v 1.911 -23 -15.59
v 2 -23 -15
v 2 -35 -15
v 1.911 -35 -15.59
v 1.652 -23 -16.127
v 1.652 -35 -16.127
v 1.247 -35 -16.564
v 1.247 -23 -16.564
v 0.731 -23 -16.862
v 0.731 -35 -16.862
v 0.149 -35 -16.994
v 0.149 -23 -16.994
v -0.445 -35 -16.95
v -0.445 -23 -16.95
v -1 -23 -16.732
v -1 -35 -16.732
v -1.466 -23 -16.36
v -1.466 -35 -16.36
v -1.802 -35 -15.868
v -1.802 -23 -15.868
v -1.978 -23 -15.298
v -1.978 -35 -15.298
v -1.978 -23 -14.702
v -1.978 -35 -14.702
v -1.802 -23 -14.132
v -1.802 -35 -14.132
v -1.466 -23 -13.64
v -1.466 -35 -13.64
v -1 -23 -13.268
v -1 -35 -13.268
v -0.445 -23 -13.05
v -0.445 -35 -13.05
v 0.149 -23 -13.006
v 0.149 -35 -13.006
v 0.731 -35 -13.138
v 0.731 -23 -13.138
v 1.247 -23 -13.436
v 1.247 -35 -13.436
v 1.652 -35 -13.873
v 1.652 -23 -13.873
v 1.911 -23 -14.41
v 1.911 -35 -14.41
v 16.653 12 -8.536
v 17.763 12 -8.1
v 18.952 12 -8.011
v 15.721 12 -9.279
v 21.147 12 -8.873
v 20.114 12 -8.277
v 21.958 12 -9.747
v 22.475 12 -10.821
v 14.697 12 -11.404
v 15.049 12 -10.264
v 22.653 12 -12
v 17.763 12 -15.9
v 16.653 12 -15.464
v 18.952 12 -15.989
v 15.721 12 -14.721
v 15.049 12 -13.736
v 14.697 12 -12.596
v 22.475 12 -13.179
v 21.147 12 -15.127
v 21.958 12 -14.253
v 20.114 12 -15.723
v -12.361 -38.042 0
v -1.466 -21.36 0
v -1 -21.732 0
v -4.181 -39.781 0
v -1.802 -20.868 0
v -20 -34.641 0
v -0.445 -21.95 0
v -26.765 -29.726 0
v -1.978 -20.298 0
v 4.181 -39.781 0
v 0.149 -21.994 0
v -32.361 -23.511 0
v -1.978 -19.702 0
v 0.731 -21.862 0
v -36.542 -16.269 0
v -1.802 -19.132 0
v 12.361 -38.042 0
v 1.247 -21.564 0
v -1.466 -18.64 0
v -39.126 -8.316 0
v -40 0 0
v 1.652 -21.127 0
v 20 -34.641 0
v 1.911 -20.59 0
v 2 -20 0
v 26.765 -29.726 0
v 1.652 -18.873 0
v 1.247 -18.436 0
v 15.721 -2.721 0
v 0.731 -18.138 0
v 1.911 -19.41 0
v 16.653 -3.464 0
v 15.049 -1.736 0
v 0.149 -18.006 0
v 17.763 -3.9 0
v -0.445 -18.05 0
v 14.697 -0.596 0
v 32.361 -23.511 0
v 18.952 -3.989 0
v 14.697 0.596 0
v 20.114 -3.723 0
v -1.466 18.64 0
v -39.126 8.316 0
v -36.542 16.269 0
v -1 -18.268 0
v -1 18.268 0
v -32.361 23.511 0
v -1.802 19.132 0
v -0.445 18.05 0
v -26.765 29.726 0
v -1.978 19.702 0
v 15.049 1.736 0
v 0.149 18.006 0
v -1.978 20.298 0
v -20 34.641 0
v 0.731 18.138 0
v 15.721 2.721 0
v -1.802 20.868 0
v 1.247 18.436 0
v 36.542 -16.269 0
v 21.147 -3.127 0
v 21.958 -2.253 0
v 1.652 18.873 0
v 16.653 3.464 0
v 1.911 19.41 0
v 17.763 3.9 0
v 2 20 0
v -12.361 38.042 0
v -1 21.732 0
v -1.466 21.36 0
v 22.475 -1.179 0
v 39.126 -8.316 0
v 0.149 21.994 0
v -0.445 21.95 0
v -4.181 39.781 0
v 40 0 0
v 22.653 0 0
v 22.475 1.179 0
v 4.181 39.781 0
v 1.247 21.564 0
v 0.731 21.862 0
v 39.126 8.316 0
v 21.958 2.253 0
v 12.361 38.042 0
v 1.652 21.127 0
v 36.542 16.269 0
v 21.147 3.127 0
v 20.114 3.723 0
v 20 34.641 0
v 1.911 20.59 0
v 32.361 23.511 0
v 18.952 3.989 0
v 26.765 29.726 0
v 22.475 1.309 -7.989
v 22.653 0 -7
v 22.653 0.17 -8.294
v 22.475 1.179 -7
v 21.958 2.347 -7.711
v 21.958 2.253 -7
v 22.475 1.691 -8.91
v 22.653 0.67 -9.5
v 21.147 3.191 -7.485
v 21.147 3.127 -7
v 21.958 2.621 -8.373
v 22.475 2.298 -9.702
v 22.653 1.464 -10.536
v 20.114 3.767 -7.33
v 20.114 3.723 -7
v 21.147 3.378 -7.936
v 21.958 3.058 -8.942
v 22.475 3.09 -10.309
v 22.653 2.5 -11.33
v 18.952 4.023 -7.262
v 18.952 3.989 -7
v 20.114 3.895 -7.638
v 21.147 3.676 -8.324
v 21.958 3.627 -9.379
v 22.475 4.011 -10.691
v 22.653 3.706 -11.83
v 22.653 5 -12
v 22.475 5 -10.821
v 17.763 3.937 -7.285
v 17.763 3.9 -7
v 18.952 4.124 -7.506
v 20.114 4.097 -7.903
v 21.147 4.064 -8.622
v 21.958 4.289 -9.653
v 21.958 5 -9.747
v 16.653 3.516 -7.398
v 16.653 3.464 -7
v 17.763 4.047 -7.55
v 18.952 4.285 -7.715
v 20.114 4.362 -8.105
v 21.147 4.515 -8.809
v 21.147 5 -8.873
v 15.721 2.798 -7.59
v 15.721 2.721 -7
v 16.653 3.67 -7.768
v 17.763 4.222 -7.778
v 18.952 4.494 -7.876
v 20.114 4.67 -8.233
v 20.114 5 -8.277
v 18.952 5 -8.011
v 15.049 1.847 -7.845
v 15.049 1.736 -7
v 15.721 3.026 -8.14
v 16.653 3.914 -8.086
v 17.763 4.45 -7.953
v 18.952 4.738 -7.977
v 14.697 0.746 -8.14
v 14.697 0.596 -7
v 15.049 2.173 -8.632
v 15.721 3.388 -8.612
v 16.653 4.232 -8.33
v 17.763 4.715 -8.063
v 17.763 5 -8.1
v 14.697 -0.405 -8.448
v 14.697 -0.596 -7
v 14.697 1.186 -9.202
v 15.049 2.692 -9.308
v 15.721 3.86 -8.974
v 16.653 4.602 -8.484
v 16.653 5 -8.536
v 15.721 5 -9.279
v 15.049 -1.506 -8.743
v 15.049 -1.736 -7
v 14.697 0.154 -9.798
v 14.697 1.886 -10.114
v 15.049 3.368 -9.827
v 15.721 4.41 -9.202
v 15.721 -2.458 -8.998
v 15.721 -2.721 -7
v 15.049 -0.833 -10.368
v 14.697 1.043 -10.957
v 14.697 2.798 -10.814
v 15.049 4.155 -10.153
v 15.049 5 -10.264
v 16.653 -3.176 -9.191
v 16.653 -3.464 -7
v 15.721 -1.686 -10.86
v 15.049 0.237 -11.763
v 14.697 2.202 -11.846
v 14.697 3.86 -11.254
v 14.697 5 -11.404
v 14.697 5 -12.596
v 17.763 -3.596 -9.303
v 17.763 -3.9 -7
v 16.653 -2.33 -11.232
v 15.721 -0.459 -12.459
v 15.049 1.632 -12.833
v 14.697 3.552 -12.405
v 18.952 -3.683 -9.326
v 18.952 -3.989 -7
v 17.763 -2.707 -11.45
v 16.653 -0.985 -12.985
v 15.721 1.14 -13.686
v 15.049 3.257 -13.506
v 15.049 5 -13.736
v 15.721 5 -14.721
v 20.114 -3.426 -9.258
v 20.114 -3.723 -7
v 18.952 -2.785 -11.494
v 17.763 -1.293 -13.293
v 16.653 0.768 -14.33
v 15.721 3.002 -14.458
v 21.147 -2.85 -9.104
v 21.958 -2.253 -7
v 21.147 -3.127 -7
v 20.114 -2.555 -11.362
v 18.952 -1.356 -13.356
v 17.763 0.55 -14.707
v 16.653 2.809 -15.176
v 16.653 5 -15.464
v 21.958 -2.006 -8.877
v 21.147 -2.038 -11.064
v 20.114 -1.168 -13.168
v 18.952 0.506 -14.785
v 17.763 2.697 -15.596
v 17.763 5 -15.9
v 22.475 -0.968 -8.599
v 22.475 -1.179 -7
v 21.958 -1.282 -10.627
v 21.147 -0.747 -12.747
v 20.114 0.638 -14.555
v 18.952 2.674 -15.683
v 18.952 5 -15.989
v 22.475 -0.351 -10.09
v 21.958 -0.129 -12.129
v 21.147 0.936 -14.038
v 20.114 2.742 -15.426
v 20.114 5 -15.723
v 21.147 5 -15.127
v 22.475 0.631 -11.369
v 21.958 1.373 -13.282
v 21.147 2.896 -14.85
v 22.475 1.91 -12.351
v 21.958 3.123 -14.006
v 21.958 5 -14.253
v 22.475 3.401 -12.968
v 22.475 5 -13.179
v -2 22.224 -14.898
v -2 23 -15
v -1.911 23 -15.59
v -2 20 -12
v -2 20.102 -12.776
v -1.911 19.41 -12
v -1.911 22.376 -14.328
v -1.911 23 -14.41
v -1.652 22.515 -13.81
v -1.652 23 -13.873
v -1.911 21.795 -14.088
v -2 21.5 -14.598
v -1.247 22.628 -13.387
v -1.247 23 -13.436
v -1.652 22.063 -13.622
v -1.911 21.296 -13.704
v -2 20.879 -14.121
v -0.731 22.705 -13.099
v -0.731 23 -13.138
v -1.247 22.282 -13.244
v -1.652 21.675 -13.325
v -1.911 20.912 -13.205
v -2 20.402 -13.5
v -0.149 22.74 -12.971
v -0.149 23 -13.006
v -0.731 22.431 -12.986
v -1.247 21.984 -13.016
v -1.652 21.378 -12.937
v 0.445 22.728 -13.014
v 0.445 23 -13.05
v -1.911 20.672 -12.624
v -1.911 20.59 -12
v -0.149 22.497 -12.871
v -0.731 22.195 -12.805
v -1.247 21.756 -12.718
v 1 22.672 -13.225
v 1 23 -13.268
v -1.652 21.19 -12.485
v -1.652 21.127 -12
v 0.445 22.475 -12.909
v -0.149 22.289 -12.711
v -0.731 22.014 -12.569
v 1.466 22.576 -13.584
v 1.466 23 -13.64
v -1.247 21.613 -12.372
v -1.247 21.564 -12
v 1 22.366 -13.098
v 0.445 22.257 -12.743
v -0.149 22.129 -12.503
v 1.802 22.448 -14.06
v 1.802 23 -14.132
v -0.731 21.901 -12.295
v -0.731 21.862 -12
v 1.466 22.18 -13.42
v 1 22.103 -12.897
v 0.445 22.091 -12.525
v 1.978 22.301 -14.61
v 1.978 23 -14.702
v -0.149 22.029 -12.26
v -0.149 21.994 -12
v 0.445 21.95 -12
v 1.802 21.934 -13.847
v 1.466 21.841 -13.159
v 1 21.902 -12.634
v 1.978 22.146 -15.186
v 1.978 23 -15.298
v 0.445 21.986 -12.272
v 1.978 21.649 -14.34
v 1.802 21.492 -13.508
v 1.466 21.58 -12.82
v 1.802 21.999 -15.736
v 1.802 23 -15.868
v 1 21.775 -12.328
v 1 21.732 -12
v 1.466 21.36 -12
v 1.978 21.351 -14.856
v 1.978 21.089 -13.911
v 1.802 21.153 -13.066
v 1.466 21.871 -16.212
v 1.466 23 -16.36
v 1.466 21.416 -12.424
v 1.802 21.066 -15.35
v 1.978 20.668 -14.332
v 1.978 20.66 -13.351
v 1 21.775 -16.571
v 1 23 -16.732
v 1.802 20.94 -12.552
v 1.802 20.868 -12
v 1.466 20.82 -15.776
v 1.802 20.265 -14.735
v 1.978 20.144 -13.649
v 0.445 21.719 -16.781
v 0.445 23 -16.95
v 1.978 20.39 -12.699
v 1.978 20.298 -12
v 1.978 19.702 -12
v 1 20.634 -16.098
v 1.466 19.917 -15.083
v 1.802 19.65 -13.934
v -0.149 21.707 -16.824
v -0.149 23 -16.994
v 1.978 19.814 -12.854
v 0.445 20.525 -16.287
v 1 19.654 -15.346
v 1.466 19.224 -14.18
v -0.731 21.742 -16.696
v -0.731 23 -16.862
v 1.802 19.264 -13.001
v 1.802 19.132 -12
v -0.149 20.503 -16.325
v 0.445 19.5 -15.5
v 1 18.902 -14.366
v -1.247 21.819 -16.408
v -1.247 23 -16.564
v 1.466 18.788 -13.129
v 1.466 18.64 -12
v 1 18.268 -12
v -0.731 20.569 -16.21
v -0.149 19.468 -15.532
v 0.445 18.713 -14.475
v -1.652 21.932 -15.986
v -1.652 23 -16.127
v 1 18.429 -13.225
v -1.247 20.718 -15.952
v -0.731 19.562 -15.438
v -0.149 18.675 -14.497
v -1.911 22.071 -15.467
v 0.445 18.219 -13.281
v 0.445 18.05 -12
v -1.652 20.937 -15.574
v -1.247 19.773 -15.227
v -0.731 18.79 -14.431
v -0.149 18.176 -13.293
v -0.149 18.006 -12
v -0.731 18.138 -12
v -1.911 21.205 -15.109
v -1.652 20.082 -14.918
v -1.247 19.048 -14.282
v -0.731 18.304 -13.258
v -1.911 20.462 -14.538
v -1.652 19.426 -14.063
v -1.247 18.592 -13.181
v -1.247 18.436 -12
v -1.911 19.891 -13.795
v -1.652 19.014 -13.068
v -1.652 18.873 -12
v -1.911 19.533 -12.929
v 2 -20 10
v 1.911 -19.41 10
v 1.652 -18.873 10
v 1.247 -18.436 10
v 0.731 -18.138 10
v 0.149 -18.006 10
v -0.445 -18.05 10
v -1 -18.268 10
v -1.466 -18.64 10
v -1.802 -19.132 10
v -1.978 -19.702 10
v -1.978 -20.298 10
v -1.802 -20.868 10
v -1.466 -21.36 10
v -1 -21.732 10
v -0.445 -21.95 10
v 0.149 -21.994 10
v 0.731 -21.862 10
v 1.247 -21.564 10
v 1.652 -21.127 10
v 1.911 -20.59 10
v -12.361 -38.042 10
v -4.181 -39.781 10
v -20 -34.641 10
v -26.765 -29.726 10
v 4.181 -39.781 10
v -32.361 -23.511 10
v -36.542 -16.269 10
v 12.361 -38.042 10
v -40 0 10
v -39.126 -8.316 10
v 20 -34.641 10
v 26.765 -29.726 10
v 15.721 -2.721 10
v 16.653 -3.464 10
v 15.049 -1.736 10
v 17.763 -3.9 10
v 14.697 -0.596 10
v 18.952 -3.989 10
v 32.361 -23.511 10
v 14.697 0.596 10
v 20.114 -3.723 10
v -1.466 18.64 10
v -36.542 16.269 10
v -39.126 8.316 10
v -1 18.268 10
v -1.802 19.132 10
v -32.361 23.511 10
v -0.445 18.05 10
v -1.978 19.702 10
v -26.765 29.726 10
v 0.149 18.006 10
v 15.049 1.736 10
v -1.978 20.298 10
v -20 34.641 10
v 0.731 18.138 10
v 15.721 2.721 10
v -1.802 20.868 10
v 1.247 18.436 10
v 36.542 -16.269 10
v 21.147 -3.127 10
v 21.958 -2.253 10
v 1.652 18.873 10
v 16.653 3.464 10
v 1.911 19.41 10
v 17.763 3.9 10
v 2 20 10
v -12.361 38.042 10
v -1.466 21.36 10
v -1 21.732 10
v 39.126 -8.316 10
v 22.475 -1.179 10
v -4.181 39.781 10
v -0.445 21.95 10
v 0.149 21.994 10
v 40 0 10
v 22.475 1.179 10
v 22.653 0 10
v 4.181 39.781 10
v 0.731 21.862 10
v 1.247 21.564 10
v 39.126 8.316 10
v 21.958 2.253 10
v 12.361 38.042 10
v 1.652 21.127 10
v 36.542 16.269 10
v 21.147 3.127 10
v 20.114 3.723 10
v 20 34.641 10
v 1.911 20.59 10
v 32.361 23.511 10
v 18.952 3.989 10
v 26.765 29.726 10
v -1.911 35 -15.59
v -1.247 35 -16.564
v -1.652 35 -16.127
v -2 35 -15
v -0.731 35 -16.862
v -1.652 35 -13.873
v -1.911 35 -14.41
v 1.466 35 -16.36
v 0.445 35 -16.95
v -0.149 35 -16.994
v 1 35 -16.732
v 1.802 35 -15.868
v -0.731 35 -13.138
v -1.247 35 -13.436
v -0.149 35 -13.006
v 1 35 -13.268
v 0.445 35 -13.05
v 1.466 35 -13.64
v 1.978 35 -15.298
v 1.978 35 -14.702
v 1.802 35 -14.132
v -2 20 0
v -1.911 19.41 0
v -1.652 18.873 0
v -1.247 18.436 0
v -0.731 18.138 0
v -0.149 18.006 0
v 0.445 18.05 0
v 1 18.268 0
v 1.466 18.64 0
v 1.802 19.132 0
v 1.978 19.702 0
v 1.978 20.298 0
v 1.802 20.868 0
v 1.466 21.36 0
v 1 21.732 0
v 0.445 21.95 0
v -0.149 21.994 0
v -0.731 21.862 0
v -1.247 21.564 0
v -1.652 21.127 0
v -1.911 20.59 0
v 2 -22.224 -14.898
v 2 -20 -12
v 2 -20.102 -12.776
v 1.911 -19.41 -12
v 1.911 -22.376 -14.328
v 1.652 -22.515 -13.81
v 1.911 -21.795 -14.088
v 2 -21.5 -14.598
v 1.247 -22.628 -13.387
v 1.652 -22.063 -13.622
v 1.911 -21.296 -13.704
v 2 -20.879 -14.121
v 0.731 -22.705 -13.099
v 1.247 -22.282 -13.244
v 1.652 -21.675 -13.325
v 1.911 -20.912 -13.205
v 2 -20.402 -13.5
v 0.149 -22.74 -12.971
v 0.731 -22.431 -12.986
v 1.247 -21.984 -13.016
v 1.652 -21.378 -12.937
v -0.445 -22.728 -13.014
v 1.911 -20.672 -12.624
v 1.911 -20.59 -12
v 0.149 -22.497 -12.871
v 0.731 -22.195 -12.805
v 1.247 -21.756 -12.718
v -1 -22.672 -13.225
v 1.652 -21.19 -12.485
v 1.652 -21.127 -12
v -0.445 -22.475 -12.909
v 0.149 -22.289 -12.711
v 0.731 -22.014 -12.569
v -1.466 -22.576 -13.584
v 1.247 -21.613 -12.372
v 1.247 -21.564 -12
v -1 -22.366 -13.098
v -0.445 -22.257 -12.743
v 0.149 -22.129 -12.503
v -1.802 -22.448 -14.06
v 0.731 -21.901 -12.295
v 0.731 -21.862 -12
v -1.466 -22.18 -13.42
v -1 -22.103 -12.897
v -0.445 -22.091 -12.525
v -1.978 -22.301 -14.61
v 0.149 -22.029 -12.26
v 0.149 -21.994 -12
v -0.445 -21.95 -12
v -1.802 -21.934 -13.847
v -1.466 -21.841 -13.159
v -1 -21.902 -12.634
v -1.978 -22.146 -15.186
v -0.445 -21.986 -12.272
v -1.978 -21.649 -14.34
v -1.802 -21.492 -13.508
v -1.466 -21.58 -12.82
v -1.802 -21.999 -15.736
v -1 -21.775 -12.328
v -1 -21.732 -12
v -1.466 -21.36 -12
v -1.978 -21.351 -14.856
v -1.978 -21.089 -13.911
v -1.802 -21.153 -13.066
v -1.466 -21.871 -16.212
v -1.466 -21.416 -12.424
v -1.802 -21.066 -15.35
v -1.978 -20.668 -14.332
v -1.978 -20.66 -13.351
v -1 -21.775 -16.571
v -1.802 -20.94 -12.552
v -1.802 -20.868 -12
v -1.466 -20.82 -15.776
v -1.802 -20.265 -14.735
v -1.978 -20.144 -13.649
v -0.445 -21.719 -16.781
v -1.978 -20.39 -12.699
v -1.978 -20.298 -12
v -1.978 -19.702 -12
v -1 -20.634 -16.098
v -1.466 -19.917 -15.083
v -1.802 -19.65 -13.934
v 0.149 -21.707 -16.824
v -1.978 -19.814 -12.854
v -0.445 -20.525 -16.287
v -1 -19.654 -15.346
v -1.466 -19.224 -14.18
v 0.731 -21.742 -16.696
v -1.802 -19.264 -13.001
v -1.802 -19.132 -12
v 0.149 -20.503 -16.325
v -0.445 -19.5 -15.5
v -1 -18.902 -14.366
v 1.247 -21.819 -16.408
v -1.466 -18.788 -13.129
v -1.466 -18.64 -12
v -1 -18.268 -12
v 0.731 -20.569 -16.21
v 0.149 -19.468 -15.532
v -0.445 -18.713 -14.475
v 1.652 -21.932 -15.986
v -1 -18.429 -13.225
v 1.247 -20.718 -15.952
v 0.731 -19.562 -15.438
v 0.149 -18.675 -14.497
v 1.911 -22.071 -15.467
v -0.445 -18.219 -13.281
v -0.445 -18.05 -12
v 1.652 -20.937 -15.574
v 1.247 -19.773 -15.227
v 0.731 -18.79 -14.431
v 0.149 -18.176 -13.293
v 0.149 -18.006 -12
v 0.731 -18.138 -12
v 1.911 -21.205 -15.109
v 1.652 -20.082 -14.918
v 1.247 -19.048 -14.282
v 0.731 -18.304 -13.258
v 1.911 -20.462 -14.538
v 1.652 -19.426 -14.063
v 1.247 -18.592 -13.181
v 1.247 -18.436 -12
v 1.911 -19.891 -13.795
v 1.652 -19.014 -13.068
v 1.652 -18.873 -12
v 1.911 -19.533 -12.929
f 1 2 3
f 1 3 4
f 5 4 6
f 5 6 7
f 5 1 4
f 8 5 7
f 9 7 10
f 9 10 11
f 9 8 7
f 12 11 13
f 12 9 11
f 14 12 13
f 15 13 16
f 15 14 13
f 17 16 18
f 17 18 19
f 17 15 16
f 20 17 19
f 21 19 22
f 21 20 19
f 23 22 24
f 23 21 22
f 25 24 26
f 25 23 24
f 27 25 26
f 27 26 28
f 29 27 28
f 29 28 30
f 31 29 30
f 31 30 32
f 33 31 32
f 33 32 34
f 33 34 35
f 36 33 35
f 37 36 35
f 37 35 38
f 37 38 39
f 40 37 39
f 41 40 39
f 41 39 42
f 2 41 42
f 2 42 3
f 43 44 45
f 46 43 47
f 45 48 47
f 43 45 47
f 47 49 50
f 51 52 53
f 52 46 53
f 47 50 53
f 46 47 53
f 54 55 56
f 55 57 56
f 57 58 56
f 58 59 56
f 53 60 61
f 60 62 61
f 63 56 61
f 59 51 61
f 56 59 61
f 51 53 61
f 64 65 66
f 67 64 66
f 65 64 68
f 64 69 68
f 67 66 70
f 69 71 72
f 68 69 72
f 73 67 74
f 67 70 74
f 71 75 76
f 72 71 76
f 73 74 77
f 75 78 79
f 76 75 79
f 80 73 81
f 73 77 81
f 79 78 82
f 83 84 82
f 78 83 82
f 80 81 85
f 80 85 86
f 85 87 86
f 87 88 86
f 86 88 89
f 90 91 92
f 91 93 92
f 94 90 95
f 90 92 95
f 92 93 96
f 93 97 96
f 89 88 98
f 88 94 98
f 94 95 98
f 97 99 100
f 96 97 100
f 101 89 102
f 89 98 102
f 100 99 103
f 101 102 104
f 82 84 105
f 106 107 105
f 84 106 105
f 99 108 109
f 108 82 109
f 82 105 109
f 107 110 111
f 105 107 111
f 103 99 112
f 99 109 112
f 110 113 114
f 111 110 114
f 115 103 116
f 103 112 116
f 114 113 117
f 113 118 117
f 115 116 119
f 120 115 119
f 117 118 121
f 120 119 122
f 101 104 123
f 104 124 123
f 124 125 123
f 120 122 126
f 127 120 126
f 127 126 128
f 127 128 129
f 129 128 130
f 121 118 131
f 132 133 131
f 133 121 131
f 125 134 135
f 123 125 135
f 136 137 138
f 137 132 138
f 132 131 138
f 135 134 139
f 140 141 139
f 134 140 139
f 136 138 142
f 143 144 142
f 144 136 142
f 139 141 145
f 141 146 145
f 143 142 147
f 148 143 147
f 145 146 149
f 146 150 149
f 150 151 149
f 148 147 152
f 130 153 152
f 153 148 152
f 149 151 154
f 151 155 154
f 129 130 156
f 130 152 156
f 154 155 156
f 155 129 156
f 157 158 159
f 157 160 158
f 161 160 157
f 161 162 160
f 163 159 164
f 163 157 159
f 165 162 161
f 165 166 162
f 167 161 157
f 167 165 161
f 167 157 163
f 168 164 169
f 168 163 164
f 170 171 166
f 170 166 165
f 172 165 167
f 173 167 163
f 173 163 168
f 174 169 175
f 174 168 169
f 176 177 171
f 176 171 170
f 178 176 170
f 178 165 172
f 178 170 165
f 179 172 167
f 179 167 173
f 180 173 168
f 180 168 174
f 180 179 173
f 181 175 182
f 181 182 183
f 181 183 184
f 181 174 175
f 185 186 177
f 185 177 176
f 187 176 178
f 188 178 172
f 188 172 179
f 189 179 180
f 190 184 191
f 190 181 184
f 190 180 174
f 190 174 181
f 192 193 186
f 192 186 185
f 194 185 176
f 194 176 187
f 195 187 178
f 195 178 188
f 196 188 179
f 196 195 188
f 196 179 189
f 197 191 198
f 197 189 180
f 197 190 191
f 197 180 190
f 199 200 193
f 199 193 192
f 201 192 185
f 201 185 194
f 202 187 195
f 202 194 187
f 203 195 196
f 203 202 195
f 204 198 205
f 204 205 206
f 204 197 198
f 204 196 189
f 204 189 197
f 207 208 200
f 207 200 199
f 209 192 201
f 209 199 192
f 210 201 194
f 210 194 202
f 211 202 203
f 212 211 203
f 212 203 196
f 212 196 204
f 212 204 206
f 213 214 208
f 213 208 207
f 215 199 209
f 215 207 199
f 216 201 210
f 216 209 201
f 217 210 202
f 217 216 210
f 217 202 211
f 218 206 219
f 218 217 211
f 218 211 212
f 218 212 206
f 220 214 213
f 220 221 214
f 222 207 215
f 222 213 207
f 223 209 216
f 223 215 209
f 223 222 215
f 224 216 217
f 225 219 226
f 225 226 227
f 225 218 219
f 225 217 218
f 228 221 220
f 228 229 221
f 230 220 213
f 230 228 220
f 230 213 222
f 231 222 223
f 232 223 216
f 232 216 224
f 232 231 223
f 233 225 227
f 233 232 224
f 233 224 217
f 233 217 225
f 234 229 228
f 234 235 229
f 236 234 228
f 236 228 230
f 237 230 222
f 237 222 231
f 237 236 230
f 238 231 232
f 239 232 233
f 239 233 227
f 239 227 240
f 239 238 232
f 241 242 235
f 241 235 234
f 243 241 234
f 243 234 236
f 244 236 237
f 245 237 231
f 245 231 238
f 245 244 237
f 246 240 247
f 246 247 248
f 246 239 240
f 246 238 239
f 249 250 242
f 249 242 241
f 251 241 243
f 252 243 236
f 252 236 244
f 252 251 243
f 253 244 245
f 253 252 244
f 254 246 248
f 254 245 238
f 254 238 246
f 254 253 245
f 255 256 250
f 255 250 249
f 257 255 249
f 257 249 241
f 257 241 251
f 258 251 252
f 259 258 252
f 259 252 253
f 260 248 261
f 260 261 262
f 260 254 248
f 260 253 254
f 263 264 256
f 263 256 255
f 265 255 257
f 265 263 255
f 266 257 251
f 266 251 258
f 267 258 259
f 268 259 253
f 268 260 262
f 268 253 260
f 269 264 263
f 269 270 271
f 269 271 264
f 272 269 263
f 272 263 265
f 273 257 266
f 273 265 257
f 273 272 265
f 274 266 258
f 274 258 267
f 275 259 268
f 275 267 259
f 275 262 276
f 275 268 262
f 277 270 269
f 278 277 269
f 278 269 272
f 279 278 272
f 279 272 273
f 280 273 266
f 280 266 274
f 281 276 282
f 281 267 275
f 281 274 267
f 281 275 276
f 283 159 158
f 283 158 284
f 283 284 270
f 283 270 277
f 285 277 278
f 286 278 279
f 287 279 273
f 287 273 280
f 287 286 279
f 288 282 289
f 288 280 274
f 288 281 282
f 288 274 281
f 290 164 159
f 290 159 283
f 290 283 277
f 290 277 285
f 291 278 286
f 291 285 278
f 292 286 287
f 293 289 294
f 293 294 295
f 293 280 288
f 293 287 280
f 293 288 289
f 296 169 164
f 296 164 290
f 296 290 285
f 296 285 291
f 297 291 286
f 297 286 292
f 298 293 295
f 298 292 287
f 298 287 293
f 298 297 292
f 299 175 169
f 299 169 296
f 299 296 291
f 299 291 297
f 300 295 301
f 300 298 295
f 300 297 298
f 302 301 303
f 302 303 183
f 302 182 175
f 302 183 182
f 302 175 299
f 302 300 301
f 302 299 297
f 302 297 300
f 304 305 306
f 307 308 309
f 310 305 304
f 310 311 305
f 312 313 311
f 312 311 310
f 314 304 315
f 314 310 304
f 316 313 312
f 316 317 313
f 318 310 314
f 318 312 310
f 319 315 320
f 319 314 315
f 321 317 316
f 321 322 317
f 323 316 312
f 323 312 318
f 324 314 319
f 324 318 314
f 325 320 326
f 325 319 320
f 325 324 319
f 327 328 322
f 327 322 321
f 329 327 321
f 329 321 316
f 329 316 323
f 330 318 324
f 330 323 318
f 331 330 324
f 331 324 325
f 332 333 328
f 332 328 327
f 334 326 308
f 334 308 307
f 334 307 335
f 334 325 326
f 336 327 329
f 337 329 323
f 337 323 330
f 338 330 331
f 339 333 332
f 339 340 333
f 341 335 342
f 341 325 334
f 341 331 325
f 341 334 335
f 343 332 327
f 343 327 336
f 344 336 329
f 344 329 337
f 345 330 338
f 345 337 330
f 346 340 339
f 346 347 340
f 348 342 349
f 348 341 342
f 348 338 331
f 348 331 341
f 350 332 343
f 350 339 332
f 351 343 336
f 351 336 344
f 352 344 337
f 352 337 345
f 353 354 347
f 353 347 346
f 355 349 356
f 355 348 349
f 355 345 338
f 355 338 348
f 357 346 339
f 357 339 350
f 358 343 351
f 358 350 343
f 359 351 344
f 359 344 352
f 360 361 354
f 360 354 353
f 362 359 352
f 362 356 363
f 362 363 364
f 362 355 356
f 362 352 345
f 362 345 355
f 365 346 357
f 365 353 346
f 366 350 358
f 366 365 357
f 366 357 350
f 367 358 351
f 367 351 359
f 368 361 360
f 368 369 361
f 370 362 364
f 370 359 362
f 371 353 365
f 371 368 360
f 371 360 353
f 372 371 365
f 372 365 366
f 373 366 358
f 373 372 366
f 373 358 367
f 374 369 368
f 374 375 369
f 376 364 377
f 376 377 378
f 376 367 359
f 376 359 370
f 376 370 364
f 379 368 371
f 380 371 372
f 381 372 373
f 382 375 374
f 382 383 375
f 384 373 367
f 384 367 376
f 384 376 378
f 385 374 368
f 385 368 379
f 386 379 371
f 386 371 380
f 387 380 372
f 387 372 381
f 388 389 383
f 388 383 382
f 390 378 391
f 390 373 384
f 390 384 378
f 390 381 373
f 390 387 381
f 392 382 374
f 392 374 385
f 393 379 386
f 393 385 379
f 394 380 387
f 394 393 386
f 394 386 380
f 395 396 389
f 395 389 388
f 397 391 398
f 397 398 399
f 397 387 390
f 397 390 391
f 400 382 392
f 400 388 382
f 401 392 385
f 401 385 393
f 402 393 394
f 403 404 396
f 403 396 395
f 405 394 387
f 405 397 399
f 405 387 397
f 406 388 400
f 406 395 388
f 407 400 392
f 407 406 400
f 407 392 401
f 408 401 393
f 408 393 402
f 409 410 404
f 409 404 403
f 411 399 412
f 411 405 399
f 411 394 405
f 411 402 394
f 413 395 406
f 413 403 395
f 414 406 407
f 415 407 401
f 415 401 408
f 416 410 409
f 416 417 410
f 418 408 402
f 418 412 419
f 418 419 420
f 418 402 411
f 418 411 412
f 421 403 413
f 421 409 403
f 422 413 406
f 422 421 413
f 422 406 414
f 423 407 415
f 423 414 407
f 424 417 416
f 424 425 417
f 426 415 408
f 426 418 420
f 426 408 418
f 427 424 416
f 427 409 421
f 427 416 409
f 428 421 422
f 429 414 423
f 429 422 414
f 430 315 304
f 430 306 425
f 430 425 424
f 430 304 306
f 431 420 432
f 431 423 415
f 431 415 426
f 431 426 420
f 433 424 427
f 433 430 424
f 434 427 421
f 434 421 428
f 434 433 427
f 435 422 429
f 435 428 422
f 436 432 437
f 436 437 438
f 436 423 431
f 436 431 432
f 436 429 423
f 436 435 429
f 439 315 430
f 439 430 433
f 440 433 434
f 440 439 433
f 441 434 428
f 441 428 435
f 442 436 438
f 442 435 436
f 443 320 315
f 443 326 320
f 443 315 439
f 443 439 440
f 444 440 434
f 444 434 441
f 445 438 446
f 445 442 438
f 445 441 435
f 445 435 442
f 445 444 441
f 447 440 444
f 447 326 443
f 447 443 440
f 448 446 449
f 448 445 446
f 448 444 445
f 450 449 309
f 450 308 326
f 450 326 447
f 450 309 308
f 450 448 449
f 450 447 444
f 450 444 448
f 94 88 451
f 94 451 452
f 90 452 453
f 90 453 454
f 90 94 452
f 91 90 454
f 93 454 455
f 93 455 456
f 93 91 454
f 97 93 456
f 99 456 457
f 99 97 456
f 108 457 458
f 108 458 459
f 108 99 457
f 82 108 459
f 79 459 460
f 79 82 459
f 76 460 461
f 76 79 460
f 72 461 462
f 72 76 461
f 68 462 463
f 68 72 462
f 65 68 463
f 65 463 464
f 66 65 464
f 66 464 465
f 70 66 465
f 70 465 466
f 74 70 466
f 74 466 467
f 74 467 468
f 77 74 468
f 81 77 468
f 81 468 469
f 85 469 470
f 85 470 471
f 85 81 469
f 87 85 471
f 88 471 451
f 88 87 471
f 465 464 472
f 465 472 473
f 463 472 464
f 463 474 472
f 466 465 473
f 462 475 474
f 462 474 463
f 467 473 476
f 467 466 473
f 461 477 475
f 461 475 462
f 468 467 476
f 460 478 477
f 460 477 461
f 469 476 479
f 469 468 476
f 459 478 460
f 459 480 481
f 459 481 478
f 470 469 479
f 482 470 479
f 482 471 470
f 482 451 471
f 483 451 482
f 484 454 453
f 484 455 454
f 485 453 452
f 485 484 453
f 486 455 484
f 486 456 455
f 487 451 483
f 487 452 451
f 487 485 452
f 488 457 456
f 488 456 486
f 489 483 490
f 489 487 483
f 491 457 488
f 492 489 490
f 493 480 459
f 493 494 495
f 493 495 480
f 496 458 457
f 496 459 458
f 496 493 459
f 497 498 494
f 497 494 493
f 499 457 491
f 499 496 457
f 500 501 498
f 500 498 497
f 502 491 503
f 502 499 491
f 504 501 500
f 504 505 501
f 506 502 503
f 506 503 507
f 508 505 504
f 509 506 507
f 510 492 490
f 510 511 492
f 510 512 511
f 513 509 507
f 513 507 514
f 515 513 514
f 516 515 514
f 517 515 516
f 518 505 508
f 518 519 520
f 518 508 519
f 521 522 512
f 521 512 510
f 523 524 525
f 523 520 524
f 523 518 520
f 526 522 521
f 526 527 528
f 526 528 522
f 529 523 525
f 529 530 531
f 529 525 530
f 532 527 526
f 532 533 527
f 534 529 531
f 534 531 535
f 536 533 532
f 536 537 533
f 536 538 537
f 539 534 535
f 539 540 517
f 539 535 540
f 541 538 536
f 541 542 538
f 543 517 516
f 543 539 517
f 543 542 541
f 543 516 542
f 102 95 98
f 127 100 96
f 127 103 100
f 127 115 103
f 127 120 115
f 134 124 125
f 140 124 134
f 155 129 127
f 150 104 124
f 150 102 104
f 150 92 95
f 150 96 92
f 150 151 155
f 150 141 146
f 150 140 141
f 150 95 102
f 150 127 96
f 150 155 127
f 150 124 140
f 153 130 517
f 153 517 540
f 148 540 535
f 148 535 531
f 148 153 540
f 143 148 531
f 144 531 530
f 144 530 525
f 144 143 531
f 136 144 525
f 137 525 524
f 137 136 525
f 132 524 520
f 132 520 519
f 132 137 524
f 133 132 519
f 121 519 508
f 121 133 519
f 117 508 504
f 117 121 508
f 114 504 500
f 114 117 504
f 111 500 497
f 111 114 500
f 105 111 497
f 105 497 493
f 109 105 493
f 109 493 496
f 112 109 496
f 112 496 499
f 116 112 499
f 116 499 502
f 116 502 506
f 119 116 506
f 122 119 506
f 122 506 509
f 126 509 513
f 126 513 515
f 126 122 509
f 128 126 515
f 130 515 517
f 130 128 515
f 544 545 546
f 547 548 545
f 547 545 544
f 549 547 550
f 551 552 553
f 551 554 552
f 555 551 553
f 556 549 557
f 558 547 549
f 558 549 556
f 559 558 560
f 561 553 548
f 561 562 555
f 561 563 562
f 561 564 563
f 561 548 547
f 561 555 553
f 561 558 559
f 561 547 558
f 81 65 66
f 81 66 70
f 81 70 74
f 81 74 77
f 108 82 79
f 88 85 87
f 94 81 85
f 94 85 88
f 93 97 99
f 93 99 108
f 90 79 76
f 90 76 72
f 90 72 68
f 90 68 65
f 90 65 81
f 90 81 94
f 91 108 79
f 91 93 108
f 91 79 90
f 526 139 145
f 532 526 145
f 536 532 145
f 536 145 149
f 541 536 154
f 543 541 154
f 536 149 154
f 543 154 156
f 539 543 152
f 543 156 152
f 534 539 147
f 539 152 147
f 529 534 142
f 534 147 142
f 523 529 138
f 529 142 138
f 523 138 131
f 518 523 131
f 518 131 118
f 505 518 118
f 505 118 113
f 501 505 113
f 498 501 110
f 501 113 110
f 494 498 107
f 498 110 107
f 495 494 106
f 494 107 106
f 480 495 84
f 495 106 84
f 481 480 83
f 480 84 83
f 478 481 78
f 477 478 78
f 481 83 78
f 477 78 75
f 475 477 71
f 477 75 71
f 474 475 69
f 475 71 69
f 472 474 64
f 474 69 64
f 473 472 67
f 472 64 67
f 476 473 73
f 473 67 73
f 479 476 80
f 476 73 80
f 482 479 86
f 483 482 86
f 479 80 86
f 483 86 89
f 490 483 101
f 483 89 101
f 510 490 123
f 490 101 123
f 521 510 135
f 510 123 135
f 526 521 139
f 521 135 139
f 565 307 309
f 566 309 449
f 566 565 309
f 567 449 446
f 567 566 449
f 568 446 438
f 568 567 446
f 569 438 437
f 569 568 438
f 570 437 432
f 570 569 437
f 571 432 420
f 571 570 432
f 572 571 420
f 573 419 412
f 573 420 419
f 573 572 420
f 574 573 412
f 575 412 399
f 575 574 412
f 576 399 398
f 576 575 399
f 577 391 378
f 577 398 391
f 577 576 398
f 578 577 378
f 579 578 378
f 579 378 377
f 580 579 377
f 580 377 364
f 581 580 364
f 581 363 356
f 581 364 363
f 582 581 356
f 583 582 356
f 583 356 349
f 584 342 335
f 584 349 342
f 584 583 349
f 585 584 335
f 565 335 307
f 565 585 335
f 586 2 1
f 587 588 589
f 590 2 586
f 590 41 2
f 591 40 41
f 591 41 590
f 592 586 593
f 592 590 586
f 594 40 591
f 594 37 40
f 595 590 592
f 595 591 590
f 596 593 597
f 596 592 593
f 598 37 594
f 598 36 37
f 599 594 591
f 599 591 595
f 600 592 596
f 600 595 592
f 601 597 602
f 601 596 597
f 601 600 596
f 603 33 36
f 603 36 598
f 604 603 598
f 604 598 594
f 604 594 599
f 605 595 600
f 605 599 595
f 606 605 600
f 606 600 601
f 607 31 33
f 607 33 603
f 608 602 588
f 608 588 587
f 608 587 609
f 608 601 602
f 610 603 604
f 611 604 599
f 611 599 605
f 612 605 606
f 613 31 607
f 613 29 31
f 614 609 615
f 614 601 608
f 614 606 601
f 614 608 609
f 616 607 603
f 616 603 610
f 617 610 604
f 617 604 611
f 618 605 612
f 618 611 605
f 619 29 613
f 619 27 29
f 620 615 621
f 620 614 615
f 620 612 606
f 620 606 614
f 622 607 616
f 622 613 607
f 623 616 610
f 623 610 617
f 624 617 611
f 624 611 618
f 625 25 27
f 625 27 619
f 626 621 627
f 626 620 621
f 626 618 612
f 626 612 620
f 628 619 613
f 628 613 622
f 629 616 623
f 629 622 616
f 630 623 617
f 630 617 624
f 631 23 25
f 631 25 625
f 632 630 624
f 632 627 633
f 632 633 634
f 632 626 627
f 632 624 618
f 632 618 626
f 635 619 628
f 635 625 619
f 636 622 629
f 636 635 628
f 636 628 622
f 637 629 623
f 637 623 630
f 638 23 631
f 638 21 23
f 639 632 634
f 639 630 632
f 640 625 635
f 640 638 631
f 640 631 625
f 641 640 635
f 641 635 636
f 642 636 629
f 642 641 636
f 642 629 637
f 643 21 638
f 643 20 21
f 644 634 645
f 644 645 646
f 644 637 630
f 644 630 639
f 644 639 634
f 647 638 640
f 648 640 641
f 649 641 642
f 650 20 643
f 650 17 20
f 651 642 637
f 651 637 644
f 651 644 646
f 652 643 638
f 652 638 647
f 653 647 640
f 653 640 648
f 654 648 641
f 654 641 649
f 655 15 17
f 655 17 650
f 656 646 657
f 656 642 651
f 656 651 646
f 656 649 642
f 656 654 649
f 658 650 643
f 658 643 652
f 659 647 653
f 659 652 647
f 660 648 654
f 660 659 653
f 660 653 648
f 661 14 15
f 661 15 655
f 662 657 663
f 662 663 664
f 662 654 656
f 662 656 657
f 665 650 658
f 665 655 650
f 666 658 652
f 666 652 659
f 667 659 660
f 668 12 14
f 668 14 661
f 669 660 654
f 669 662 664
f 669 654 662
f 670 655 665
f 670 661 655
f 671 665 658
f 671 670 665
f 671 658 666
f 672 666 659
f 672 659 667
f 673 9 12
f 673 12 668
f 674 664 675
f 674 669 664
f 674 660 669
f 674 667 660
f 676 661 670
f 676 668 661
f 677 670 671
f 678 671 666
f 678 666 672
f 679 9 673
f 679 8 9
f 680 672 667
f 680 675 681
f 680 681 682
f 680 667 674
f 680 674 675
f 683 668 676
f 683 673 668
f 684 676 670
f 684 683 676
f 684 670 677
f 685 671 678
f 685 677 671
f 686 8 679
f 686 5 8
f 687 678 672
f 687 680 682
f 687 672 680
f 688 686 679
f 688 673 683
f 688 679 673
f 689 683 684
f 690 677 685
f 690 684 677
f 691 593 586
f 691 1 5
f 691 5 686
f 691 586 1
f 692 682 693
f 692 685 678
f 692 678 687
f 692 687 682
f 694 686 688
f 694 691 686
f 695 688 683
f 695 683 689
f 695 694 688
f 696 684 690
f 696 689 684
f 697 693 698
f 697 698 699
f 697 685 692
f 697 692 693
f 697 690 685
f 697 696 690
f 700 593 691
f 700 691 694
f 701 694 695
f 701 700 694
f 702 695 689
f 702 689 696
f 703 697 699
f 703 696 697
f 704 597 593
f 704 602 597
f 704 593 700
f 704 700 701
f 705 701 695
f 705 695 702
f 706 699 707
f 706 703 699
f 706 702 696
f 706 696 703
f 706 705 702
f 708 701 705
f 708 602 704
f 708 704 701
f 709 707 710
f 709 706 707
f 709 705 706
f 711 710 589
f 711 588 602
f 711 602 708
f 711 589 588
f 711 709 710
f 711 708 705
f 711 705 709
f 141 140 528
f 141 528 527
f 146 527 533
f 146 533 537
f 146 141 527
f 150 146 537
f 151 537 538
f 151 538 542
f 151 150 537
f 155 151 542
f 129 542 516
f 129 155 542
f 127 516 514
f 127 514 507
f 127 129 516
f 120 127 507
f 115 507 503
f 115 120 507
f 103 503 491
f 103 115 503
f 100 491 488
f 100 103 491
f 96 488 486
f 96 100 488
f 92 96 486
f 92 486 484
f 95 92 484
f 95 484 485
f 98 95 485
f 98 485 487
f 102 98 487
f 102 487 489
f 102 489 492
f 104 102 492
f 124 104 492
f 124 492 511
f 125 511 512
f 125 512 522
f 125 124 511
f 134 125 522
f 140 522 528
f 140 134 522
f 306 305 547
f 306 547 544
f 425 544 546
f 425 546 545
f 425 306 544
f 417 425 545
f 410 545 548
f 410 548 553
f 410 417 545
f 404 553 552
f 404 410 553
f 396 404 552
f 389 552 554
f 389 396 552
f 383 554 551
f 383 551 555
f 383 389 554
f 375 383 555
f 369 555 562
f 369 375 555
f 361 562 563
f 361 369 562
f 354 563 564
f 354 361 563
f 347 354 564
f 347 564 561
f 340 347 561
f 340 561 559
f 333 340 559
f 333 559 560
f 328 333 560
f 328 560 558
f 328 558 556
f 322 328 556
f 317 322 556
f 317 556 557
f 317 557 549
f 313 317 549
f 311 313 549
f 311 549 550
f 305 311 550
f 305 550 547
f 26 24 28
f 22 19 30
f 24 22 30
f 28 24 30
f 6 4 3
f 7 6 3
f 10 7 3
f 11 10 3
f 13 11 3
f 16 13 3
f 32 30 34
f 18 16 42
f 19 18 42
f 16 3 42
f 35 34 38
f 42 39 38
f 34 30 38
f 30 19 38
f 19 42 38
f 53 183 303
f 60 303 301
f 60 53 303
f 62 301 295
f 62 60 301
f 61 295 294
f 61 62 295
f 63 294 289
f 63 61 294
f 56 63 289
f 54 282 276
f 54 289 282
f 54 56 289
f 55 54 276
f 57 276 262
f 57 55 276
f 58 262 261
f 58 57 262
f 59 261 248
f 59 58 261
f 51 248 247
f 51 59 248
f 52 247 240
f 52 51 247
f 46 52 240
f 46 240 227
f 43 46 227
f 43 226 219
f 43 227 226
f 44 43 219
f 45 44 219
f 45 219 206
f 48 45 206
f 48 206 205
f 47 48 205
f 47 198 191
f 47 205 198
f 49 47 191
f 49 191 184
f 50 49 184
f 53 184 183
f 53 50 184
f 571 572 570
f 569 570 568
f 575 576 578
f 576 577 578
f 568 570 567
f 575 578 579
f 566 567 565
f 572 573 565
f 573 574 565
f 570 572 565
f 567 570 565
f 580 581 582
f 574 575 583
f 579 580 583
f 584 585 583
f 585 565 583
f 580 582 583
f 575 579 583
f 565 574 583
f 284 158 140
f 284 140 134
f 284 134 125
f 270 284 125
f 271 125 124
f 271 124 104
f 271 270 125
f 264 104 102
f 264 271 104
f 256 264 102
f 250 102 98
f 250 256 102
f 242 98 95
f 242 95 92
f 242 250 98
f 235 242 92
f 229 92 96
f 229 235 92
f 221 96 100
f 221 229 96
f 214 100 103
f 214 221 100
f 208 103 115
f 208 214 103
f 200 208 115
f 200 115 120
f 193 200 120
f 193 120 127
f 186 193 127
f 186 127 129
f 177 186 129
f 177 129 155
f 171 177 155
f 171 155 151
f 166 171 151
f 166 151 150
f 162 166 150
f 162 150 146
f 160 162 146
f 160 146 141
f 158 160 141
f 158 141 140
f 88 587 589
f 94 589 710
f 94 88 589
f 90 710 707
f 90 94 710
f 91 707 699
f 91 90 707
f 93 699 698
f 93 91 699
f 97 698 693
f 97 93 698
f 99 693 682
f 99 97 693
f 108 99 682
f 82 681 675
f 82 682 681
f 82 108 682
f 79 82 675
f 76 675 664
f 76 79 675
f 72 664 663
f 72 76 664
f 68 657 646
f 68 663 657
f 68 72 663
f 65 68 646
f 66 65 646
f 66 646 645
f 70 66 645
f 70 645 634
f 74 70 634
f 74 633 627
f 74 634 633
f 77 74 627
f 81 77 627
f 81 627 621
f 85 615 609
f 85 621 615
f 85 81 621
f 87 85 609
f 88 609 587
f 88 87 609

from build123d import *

# Parameters (mm, degrees)
SKETCH1_R           = 40
SKETCH1_R_2         = 2
SKETCH1_R_3         = 4
BOSS_EXTRUDE1_DEPTH = 10
SKETCH5_R           = 2
SKETCH3_R           = 2
SKETCH6_R           = 4


with BuildPart() as part:
    # Sketch1 → Boss-Extrude1 (new body)
    with BuildSketch(Plane.XY):
        Circle(SKETCH1_R)
        with Locations((0, 20)):
            Circle(SKETCH1_R_2, mode=Mode.SUBTRACT)
        with Locations((0, -20)):
            Circle(SKETCH1_R_2, mode=Mode.SUBTRACT)
        with Locations((18.65280258, 0)):
            Circle(SKETCH1_R_3, mode=Mode.SUBTRACT)
    extrude(amount=BOSS_EXTRUDE1_DEPTH)


with BuildPart() as body_2:
    # Sweep4: sweep along a path in Sketch4
    with BuildLine(Plane(origin=(0, 0, 0), x_dir=(0, 0, -1), z_dir=(1, 0, 0))) as sweep4_path:
        Line((17, -35), (17, -23))
        ThreePointArc((17, -23), (15.535533906, -19.464466094), (12, -18))
        Line((12, -18), (0, -18))
    # Sketch5 → Sweep4 (sweep)
    with BuildSketch(Plane.XY):
        with Locations((0, -20)):
            Circle(SKETCH5_R)
    sweep(path=sweep4_path.line)


with BuildPart() as body_3:
    # Sweep5: sweep along a path in Sketch2
    with BuildLine(Plane(origin=(0, 0, 0), x_dir=(0, 0, -1), z_dir=(1, 0, 0))) as sweep5_path:
        Line((17, 35), (17, 23))
        ThreePointArc((17, 23), (15.535533906, 19.464466094), (12, 18))
        Line((12, 18), (0, 18))
    # Sketch3 → Sweep5 (sweep)
    with BuildSketch(Plane(origin=(0, 0, 0), x_dir=(-1, 0, 0), z_dir=(0, 0, -1))):
        with Locations((0, 20)):
            Circle(SKETCH3_R)
    sweep(path=sweep5_path.line)


with BuildPart() as body_4:
    # Sweep6: sweep along a path in Sketch8
    with BuildLine(Plane(origin=(18.65280258, 0, 0), x_dir=(0, 0, -1), z_dir=(1, 0, 0))) as sweep6_path:
        Line((0, 0), (7, 0))
        ThreePointArc((7, 0), (10.535533906, 1.464466094), (12, 5))
        Line((12, 5), (12, 12))
    # Sketch6 → Sweep6 (sweep)
    with BuildSketch(Plane.XY):
        with Locations((18.65280258, 0)):
            Circle(SKETCH6_R)
    sweep(path=sweep6_path.line)


solid = Compound([part.part, body_2.part, body_3.part, body_4.part])
